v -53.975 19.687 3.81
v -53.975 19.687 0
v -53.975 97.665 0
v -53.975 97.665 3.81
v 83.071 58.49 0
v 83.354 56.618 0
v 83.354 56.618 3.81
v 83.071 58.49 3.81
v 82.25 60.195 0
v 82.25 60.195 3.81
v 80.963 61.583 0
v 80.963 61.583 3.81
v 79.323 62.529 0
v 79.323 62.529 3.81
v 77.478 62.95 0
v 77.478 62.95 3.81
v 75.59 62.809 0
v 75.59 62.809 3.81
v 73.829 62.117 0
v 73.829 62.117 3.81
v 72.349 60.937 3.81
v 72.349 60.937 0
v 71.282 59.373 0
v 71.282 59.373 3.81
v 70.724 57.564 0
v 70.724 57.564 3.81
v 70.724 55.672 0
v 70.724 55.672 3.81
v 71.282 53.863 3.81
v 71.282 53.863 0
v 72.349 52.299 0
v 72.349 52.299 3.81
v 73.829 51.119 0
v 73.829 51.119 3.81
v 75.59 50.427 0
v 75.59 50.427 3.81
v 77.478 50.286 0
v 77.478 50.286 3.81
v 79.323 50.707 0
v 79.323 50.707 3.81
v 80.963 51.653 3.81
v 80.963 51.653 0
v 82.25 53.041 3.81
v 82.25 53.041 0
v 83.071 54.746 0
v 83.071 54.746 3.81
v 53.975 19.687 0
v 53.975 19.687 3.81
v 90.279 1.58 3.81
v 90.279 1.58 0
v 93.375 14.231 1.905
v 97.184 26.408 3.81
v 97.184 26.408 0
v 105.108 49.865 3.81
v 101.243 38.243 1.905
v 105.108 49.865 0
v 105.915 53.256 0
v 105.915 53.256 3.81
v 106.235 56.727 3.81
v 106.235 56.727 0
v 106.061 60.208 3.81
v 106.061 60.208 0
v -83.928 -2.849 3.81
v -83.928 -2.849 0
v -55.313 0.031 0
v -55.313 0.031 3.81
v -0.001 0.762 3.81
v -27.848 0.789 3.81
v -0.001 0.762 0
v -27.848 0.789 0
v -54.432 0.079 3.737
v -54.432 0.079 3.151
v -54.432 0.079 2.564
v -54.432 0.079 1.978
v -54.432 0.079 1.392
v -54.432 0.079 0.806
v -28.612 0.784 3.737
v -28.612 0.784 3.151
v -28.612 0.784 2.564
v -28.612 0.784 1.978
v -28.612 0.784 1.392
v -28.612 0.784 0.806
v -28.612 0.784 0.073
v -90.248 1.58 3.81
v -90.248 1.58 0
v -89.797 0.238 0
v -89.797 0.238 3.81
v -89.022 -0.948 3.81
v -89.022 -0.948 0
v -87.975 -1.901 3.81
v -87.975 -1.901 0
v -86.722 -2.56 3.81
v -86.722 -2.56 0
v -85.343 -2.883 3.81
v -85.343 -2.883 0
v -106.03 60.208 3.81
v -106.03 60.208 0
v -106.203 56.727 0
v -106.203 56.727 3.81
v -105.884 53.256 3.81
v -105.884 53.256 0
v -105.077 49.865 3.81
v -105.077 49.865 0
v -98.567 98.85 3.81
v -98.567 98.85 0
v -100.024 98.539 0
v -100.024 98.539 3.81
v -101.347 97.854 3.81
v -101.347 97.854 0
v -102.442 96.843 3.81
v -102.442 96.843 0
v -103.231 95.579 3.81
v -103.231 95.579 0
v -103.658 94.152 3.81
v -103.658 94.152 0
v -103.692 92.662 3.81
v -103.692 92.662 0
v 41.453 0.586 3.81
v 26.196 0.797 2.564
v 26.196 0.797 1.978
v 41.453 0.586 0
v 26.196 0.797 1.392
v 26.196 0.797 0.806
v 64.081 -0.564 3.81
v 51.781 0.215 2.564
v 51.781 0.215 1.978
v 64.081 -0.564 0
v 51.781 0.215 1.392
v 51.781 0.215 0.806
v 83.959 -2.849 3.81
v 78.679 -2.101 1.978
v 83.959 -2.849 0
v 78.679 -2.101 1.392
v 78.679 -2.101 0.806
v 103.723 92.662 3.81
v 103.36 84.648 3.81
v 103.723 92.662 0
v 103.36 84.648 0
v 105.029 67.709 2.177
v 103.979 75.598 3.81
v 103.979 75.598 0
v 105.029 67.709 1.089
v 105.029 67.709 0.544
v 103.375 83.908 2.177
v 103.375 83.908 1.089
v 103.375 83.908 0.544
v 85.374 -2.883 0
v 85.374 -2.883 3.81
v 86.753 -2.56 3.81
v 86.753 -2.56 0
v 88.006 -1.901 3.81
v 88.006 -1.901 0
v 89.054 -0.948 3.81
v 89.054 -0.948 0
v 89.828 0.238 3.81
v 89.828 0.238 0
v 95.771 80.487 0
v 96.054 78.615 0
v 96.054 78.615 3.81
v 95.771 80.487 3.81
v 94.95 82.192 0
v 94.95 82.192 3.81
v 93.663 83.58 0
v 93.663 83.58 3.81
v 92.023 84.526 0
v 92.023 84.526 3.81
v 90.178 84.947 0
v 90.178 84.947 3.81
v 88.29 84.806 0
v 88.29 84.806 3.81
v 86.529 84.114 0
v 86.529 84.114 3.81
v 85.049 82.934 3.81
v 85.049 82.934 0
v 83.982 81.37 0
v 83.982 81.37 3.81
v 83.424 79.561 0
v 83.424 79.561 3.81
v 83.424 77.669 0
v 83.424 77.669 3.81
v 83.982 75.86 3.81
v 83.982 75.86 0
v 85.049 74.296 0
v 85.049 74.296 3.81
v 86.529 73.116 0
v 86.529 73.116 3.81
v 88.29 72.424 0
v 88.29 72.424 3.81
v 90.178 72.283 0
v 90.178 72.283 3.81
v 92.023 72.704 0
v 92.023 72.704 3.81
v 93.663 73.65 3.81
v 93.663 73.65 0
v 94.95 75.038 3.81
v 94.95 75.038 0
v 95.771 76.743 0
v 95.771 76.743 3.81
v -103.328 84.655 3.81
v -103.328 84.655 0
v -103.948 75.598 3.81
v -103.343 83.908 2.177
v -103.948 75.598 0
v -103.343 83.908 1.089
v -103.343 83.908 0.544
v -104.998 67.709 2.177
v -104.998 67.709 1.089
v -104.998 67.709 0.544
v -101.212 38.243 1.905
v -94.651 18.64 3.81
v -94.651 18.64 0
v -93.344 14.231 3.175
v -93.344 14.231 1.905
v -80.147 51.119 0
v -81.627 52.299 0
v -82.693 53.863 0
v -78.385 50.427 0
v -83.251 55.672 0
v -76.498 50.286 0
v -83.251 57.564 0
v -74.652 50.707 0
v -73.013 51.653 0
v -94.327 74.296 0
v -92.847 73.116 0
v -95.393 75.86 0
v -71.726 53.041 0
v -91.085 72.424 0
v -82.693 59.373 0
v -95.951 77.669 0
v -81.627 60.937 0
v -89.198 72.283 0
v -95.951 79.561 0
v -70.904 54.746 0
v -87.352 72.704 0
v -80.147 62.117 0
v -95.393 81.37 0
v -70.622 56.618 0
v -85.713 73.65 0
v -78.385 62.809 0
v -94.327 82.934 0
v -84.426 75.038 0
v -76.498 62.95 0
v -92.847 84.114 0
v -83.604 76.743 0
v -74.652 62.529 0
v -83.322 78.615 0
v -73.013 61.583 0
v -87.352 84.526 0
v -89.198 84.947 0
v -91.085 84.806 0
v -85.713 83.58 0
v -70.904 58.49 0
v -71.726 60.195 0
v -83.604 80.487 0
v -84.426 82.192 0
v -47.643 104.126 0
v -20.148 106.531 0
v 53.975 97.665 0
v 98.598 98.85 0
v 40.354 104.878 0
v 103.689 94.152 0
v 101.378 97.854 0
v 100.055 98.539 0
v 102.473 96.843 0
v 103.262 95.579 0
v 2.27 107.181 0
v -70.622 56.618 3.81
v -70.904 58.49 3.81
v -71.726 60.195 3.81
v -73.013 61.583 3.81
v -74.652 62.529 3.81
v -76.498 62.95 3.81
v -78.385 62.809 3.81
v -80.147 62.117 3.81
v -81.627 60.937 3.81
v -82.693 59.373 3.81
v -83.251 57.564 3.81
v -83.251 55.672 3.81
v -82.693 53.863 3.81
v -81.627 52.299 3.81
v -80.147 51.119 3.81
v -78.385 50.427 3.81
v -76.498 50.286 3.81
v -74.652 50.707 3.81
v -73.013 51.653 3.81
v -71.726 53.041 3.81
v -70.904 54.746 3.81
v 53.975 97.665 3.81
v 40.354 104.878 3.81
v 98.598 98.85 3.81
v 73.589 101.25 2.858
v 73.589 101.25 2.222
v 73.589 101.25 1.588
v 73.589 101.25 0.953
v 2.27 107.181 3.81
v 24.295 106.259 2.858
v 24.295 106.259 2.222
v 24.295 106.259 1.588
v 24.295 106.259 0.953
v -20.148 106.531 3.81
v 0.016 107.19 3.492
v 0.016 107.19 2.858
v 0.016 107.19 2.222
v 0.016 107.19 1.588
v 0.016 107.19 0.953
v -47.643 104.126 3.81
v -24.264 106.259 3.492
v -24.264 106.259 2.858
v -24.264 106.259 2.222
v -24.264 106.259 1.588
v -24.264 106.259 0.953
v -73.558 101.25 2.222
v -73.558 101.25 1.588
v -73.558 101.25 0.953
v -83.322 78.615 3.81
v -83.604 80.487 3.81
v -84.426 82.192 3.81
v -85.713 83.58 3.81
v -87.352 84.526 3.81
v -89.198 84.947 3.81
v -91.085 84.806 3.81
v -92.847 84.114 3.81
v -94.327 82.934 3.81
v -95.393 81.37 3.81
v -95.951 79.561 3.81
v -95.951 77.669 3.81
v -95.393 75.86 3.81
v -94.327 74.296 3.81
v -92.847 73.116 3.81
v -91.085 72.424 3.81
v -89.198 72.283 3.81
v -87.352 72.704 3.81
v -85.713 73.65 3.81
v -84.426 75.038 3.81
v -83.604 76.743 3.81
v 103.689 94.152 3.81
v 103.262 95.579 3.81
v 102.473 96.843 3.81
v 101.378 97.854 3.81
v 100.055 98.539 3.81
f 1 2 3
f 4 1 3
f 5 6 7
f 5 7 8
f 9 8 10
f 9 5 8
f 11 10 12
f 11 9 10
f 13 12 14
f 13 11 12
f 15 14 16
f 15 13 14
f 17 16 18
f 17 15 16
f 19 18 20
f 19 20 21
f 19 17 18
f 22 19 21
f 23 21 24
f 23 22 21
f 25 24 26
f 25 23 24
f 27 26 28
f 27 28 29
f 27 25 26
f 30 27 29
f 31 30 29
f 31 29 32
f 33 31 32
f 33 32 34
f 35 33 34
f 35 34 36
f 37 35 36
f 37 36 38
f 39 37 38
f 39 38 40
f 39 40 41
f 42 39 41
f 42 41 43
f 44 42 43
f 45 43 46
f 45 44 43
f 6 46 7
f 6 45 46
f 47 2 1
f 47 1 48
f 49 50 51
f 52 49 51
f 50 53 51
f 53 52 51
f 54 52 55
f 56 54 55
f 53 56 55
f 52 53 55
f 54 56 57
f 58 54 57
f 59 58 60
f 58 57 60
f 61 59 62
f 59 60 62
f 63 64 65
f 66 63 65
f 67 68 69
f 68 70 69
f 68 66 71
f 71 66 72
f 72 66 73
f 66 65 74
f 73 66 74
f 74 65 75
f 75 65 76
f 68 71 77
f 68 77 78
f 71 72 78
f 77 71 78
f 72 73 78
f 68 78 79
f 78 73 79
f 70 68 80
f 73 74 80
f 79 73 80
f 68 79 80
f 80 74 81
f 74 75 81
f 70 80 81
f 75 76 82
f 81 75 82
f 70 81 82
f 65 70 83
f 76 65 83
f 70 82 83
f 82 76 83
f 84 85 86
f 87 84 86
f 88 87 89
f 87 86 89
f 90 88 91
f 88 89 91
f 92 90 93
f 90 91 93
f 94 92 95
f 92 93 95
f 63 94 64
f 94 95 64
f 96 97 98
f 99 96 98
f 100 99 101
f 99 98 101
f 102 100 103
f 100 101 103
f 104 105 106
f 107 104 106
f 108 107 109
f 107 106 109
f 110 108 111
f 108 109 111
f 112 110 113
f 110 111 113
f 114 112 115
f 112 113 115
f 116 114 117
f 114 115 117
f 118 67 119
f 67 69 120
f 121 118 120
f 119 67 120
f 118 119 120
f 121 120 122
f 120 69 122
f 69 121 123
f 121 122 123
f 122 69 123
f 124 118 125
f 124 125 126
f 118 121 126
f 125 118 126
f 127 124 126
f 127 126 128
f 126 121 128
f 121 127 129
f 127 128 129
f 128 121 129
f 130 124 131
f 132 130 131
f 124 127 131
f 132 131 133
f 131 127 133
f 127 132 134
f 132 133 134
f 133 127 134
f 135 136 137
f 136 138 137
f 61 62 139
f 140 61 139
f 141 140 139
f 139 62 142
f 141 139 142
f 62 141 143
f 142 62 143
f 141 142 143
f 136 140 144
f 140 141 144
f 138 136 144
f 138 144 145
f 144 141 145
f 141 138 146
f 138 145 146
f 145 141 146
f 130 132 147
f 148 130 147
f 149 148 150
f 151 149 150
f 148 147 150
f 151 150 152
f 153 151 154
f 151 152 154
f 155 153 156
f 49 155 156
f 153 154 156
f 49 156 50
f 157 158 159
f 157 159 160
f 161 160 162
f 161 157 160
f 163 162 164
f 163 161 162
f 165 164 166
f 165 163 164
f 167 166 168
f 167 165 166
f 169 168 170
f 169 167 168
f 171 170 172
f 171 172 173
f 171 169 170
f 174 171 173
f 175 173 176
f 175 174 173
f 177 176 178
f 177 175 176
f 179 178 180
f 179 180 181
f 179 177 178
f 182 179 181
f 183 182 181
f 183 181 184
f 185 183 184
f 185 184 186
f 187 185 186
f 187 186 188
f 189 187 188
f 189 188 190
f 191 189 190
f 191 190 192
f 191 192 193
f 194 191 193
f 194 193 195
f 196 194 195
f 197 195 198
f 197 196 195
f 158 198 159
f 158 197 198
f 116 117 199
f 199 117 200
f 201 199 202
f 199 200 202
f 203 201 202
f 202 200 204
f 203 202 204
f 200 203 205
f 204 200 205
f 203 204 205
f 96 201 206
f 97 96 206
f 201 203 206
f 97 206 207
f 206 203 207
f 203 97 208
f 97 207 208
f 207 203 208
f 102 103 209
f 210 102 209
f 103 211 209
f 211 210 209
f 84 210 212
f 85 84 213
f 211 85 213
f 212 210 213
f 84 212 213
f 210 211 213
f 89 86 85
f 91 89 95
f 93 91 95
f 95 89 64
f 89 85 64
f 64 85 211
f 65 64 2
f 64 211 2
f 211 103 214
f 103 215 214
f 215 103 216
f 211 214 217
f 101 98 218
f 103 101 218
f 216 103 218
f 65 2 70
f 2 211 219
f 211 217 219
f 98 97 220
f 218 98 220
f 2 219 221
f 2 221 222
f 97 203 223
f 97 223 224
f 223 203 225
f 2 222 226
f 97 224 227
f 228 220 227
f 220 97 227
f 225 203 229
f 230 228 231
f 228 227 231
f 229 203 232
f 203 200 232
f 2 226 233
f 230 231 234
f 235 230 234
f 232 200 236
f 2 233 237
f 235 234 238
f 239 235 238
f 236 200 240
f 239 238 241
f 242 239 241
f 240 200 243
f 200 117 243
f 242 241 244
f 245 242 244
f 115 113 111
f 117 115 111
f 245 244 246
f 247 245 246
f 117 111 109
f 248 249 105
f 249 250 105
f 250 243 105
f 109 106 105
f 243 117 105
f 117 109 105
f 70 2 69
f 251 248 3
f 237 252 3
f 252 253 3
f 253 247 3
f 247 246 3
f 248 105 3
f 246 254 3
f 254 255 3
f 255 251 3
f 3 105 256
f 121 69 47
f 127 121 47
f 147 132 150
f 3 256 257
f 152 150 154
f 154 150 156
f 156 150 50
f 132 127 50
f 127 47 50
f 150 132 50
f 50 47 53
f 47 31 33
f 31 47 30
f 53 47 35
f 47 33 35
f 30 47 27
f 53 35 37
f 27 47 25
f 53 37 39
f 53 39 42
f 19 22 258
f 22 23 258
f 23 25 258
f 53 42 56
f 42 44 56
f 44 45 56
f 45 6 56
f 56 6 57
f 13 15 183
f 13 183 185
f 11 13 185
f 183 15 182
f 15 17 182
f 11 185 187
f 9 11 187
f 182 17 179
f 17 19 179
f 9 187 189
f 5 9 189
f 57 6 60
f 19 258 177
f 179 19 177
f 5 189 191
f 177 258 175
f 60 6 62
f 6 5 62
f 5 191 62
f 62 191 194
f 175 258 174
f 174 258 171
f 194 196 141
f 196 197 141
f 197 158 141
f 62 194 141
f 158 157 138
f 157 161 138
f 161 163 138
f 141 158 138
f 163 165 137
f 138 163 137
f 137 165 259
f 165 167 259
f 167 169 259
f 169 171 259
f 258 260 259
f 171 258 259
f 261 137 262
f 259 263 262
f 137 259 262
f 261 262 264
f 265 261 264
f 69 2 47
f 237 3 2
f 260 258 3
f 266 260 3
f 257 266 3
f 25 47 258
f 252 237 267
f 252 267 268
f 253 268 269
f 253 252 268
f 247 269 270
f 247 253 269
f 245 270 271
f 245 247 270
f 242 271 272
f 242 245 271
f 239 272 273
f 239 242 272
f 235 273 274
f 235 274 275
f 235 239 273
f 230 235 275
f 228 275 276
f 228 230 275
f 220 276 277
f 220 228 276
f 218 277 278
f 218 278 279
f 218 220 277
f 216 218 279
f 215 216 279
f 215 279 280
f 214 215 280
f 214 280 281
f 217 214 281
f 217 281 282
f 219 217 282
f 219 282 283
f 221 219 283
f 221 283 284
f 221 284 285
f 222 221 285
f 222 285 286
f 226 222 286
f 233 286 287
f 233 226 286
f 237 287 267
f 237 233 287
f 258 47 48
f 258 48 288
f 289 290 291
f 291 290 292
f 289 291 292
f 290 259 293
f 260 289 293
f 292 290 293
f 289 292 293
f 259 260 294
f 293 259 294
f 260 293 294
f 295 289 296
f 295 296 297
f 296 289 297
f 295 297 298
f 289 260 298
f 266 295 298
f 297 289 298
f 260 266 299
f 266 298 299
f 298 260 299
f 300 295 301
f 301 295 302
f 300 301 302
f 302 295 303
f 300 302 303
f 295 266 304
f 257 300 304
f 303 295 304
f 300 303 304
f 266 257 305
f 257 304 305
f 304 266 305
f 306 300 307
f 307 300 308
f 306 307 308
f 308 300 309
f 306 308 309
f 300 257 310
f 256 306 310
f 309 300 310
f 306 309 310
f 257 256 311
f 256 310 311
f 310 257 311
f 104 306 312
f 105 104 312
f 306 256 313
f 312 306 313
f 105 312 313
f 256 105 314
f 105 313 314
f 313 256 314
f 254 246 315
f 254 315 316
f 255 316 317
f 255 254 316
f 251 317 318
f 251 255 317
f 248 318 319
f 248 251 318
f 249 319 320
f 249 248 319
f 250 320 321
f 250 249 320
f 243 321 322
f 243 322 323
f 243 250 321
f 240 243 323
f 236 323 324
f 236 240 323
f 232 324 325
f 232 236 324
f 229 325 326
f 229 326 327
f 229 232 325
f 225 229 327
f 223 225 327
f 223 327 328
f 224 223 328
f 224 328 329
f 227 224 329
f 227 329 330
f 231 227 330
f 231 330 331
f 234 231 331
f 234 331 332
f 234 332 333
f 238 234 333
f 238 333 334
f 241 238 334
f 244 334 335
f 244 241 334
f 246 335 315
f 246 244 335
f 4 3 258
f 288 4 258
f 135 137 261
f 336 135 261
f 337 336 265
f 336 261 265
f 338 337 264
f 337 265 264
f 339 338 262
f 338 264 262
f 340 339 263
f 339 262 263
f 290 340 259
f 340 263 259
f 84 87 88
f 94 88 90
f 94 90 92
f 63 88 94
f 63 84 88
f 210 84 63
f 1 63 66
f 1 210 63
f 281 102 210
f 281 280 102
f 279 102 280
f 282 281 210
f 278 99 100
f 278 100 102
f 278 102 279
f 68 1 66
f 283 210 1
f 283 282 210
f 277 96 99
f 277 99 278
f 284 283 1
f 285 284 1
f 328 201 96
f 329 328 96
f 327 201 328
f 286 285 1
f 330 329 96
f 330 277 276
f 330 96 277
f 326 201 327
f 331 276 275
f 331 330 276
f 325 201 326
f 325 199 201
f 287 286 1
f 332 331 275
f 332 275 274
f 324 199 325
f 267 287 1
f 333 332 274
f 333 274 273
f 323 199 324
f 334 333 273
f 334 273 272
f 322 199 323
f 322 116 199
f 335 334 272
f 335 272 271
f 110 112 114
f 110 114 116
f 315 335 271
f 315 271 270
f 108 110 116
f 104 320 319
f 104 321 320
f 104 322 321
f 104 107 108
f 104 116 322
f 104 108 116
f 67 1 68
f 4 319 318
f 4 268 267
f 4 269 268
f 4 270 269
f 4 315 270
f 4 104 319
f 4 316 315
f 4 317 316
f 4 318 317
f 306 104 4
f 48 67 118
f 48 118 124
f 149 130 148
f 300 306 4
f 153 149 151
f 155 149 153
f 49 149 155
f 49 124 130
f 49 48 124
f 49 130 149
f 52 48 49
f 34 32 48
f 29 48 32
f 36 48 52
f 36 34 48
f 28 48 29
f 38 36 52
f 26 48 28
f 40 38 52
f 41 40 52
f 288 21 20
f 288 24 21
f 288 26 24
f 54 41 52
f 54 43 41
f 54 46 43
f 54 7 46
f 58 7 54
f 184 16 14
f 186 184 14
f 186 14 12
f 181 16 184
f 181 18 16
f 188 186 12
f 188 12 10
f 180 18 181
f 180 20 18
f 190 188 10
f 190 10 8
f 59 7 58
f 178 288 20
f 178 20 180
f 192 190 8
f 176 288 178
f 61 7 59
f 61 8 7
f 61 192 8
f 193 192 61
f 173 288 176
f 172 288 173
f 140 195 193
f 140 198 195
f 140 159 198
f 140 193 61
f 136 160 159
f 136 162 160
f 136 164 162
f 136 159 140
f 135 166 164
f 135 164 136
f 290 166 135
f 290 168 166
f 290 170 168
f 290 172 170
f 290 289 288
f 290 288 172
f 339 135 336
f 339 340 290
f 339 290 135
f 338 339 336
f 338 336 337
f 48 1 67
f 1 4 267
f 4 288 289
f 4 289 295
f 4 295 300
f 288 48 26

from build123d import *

# Parameters (mm, degrees)
SKETCH1_R           = 6.35
SKETCH1_W           = 107.95
SKETCH1_H           = 77.978
BOSS_EXTRUDE1_DEPTH = 3.81


with BuildPart() as part:
    # Sketch1 → Boss-Extrude1 (new body)
    with BuildSketch(Plane.XY):
        with BuildLine():
            ThreePointArc((-90.247945126, 1.580161299), (-87.975141882, -1.900637883), (-83.927585414, -2.848732901))
            add(Edge.make_bspline(
                [(-83.927585414, -2.848732901), (-83.054070471, -2.715786742), (-81.312732205, -2.460099658), (-78.654295906, -2.097457818), (-75.966491195, -1.758240891), (-72.336992818, -1.336160635), (-68.643939449, -0.959865866), (-65.583983691, -0.690535221), (-64.166779255, -0.573734085), (-63.566148315, -0.525577724), (-63.104217983, -0.489316665), (-62.699894104, -0.457970525), (-61.962459601, -0.401810292), (-60.915867879, -0.325087188), (-59.217621249, -0.20679221), (-57.068227268, -0.068668175), (-54.439670256, 0.082013873), (-51.767032951, 0.217415022), (-49.490906759, 0.318006821), (-48.009034739, 0.376639561), (-47.303600356, 0.403182815), (-46.87624745, 0.418937653), (-46.196192411, 0.443333549), (-45.175910497, 0.47801298), (-43.54019985, 0.529440772), (-41.442918551, 0.587830962), (-38.856544752, 0.647964805), (-36.195775126, 0.698343729), (-33.919375463, 0.73216057), (-32.406847373, 0.750213929), (-31.706246722, 0.757752509), (-31.408404648, 0.760817662), (-31.181163199, 0.763075054), (-31.021391801, 0.764629932), (-30.707730066, 0.767603553), (-30.26986268, 0.771505625), (-29.546357408, 0.777455403), (-28.619562792, 0.78413893), (-27.465024779, 0.791021083), (-25.871235622, 0.798660769), (-23.776420321, 0.805345875), (-21.095419523, 0.808788849), (-18.730229007, 0.807870354), (-16.988945077, 0.805198844), (-16.118237596, 0.803410927), (-15.586446283, 0.802172614), (-15.160582097, 0.801119107), (-14.629388092, 0.799779587), (-13.778859371, 0.797542602), (-12.290567631, 0.793391761), (-10.165619586, 0.786950406), (-7.609712384, 0.777596832), (-4.232901772, 0.76670962), (-1.692574695, 0.762894866), (-0.000735939, 0.762000495)],
                knots=[0.344883789, 0.344883789, 0.344883789, 0.344883789, 0.365355884, 0.385827978, 0.406300073, 0.426772167, 0.467716357, 0.488188451, 0.493306475, 0.498424499, 0.50098351, 0.503542522, 0.508660546, 0.518896593, 0.529132641, 0.549604735, 0.57007683, 0.590548924, 0.611021019, 0.621257066, 0.623816078, 0.62637509, 0.631493114, 0.641729161, 0.651965208, 0.672437303, 0.692909397, 0.713381492, 0.733853587, 0.744089634, 0.746648646, 0.749207658, 0.750487163, 0.751766669, 0.754325681, 0.759443705, 0.764561728, 0.774797776, 0.785033823, 0.79526987, 0.815741965, 0.83621406, 0.856686154, 0.866922202, 0.872040225, 0.874599237, 0.877158249, 0.882276272, 0.887394296, 0.897630343, 0.918102438, 0.938574533, 0.959046627, 0.999990816, 0.999990816, 0.999990816, 0.999990816], degree=3))
            add(Edge.make_bspline(
                [(-0.000735939, 0.762000495), (1.697316836, 0.766177734), (4.244409913, 0.77253852), (7.640476943, 0.781209392), (10.187668405, 0.787807526), (12.309879884, 0.793384892), (13.796306461, 0.797330932), (14.644321151, 0.799597123), (15.177550854, 0.80101974), (15.596748301, 0.802157809), (16.118287, 0.803504136), (16.973995966, 0.80545727), (18.68829658, 0.808424504), (21.027999055, 0.809635512), (23.697872289, 0.806345409), (25.799893716, 0.79962074), (27.409267347, 0.791849991), (28.580317931, 0.784820707), (29.525162279, 0.777971464), (30.265021199, 0.771870135), (30.715280941, 0.767851736), (31.035813921, 0.764814821), (31.203310927, 0.763185732), (31.424674383, 0.760990419), (31.725461502, 0.75790149), (32.424670998, 0.75038892), (33.939142843, 0.732342076), (36.215243056, 0.698563653), (38.877142881, 0.648210549), (41.464408025, 0.588096862), (43.562364845, 0.52972496), (45.199123553, 0.478290291), (46.218966314, 0.443646588), (46.900949422, 0.419191941), (47.325920748, 0.403533269), (48.032310107, 0.376969373), (49.513622078, 0.318385817), (51.790729101, 0.217796458), (54.463869347, 0.082412308), (57.093216384, -0.068273652), (59.243322334, -0.206412508), (60.942131401, -0.324720902), (61.989228303, -0.401465522), (62.726751965, -0.457620494), (63.131559362, -0.488998275), (63.592361081, -0.52516306), (64.193703385, -0.573365144), (65.61087209, -0.690141767), (68.671780552, -0.959508913), (72.365460908, -1.33583339), (75.995808252, -1.757987944), (78.68423516, -2.097273121), (81.343310776, -2.459998054), (83.085085672, -2.715750704), (83.958817154, -2.848731481)],
                knots=[9.152e-06, 9.152e-06, 9.152e-06, 9.152e-06, 0.040956877, 0.06143074, 0.081904603, 0.102378465, 0.112615397, 0.117733862, 0.122852328, 0.125411561, 0.127970794, 0.133089259, 0.143326191, 0.163800053, 0.184273916, 0.204747779, 0.21498471, 0.225221641, 0.235458573, 0.240577038, 0.245695504, 0.248254737, 0.249534353, 0.25081397, 0.253373202, 0.255932435, 0.266169367, 0.286643229, 0.307117092, 0.327590954, 0.348064817, 0.358301748, 0.36853868, 0.373657145, 0.376216378, 0.378775611, 0.389012542, 0.409486405, 0.429960268, 0.45043413, 0.470907993, 0.481144924, 0.491381856, 0.496500321, 0.499059554, 0.501618787, 0.506737253, 0.511855718, 0.532329581, 0.573277306, 0.593751169, 0.614225032, 0.634698894, 0.655172757, 0.655172757, 0.655172757, 0.655172757], degree=3))
            ThreePointArc((83.958817154, -2.848731481), (88.006379638, -1.900641004), (90.279187133, 1.58016116))
            add(Edge.make_bspline(
                [(90.279187133, 1.58016116), (90.707255223, 3.721330409), (91.671139987, 8.001579794), (93.903510476, 16.331728227), (97.14338237, 26.467199173), (100.58708015, 36.306691054), (103.244940111, 44.084996329), (104.500326759, 47.928352327), (105.108428455, 49.864950567)],
                knots=[-0.293557602, -0.293557602, -0.293557602, -0.293557602, -0.147731648, -0.001905695, 0.289746211, 0.581398118, 0.727224071, 0.873050024, 0.873050024, 0.873050024, 0.873050024], degree=3))
            ThreePointArc((105.108428455, 49.864950567), (106.136144084, 54.985756874), (106.061342514, 60.208137689))
            add(Edge.make_bspline(
                [(106.061342514, 60.208137689), (105.911666294, 61.444092118), (105.583988035, 63.887611007), (104.845109607, 68.962564326), (103.906894516, 75.52680744), (103.330597064, 82.448292199), (103.345249689, 87.49082735), (103.504349867, 90.423192606), (103.641008775, 91.919668099), (103.72344879, 92.661964135)],
                knots=[0.224037882, 0.224037882, 0.224037882, 0.224037882, 0.367934399, 0.511830915, 0.799623948, 1.087416981, 1.231313498, 1.303261756, 1.375210014, 1.375210014, 1.375210014, 1.375210014], degree=3))
            ThreePointArc((103.72344879, 92.661964135), (102.473247846, 96.843092134), (98.598214744, 98.850317136))
            add(Edge.make_bspline(
                [(98.598214744, 98.850317136), (94.416094473, 99.172048045), (86.049981349, 99.919191974), (69.422551197, 101.674055975), (48.779184165, 104.086919071), (28.344626534, 106.081432238), (12.109022695, 107.012529299), (4.052738444, 107.190075663), (0.015621033, 107.190075663)],
                knots=[0.21837869, 0.21837869, 0.21837869, 0.21837869, 0.316081353, 0.413784017, 0.609189345, 0.804594672, 0.902297336, 1, 1, 1, 1], degree=3))
            add(Edge.make_bspline(
                [(0.015621033, 107.190075663), (-4.021496378, 107.190075663), (-12.077780629, 107.012529299), (-28.313384468, 106.081432237), (-48.747942099, 104.08691907), (-69.39130913, 101.674055973), (-86.018739283, 99.919191972), (-94.384852407, 99.172048042), (-98.566972677, 98.850317134)],
                knots=[0, 0, 0, 0, 0.097702664, 0.195405328, 0.390810655, 0.586215983, 0.683918647, 0.78162131, 0.78162131, 0.78162131, 0.78162131], degree=3))
            ThreePointArc((-98.566972677, 98.850317134), (-102.442005779, 96.843092132), (-103.692206724, 92.661964133))
            add(Edge.make_bspline(
                [(-103.692206724, 92.661964133), (-103.609766709, 91.919668097), (-103.4731078, 90.423192604), (-103.314007622, 87.490827347), (-103.299354998, 82.448292195), (-103.875652451, 75.526807436), (-104.813867543, 68.962564321), (-105.552745972, 63.887611001), (-105.880424231, 61.444092112), (-106.030100451, 60.208137683)],
                knots=[-0.375210014, -0.375210014, -0.375210014, -0.375210014, -0.303261756, -0.231313498, -0.087416981, 0.200376052, 0.488169085, 0.632065601, 0.775962118, 0.775962118, 0.775962118, 0.775962118], degree=3))
            ThreePointArc((-106.030100451, 60.208137683), (-106.104902022, 54.985756873), (-105.077186396, 49.864950571))
            add(Edge.make_bspline(
                [(-105.077186396, 49.864950571), (-104.469084703, 47.928352336), (-103.213698061, 44.084996348), (-100.555838111, 36.306691093), (-97.112140347, 26.467199238), (-93.872268464, 16.33172832), (-91.63989798, 8.001579913), (-90.676013216, 3.721330541), (-90.247945126, 1.580161299)],
                knots=[0.126949976, 0.126949976, 0.126949976, 0.126949976, 0.272775929, 0.418601881, 0.710253787, 1.001905692, 1.147731645, 1.293557598, 1.293557598, 1.293557598, 1.293557598], degree=3))
        make_face()
        with Locations((-89.672260323, 78.615075663)):
            Circle(SKETCH1_R, mode=Mode.SUBTRACT)
        with Locations((89.703502388, 78.615075663)):
            Circle(SKETCH1_R, mode=Mode.SUBTRACT)
        with Locations((-76.972260323, 56.618030407)):
            Circle(SKETCH1_R, mode=Mode.SUBTRACT)
        with Locations((77.003502388, 56.618030407)):
            Circle(SKETCH1_R, mode=Mode.SUBTRACT)
        with Locations((0, 58.676075663)):
            Rectangle(SKETCH1_W, SKETCH1_H, mode=Mode.SUBTRACT)
    extrude(amount=BOSS_EXTRUDE1_DEPTH)


solid = part.part
